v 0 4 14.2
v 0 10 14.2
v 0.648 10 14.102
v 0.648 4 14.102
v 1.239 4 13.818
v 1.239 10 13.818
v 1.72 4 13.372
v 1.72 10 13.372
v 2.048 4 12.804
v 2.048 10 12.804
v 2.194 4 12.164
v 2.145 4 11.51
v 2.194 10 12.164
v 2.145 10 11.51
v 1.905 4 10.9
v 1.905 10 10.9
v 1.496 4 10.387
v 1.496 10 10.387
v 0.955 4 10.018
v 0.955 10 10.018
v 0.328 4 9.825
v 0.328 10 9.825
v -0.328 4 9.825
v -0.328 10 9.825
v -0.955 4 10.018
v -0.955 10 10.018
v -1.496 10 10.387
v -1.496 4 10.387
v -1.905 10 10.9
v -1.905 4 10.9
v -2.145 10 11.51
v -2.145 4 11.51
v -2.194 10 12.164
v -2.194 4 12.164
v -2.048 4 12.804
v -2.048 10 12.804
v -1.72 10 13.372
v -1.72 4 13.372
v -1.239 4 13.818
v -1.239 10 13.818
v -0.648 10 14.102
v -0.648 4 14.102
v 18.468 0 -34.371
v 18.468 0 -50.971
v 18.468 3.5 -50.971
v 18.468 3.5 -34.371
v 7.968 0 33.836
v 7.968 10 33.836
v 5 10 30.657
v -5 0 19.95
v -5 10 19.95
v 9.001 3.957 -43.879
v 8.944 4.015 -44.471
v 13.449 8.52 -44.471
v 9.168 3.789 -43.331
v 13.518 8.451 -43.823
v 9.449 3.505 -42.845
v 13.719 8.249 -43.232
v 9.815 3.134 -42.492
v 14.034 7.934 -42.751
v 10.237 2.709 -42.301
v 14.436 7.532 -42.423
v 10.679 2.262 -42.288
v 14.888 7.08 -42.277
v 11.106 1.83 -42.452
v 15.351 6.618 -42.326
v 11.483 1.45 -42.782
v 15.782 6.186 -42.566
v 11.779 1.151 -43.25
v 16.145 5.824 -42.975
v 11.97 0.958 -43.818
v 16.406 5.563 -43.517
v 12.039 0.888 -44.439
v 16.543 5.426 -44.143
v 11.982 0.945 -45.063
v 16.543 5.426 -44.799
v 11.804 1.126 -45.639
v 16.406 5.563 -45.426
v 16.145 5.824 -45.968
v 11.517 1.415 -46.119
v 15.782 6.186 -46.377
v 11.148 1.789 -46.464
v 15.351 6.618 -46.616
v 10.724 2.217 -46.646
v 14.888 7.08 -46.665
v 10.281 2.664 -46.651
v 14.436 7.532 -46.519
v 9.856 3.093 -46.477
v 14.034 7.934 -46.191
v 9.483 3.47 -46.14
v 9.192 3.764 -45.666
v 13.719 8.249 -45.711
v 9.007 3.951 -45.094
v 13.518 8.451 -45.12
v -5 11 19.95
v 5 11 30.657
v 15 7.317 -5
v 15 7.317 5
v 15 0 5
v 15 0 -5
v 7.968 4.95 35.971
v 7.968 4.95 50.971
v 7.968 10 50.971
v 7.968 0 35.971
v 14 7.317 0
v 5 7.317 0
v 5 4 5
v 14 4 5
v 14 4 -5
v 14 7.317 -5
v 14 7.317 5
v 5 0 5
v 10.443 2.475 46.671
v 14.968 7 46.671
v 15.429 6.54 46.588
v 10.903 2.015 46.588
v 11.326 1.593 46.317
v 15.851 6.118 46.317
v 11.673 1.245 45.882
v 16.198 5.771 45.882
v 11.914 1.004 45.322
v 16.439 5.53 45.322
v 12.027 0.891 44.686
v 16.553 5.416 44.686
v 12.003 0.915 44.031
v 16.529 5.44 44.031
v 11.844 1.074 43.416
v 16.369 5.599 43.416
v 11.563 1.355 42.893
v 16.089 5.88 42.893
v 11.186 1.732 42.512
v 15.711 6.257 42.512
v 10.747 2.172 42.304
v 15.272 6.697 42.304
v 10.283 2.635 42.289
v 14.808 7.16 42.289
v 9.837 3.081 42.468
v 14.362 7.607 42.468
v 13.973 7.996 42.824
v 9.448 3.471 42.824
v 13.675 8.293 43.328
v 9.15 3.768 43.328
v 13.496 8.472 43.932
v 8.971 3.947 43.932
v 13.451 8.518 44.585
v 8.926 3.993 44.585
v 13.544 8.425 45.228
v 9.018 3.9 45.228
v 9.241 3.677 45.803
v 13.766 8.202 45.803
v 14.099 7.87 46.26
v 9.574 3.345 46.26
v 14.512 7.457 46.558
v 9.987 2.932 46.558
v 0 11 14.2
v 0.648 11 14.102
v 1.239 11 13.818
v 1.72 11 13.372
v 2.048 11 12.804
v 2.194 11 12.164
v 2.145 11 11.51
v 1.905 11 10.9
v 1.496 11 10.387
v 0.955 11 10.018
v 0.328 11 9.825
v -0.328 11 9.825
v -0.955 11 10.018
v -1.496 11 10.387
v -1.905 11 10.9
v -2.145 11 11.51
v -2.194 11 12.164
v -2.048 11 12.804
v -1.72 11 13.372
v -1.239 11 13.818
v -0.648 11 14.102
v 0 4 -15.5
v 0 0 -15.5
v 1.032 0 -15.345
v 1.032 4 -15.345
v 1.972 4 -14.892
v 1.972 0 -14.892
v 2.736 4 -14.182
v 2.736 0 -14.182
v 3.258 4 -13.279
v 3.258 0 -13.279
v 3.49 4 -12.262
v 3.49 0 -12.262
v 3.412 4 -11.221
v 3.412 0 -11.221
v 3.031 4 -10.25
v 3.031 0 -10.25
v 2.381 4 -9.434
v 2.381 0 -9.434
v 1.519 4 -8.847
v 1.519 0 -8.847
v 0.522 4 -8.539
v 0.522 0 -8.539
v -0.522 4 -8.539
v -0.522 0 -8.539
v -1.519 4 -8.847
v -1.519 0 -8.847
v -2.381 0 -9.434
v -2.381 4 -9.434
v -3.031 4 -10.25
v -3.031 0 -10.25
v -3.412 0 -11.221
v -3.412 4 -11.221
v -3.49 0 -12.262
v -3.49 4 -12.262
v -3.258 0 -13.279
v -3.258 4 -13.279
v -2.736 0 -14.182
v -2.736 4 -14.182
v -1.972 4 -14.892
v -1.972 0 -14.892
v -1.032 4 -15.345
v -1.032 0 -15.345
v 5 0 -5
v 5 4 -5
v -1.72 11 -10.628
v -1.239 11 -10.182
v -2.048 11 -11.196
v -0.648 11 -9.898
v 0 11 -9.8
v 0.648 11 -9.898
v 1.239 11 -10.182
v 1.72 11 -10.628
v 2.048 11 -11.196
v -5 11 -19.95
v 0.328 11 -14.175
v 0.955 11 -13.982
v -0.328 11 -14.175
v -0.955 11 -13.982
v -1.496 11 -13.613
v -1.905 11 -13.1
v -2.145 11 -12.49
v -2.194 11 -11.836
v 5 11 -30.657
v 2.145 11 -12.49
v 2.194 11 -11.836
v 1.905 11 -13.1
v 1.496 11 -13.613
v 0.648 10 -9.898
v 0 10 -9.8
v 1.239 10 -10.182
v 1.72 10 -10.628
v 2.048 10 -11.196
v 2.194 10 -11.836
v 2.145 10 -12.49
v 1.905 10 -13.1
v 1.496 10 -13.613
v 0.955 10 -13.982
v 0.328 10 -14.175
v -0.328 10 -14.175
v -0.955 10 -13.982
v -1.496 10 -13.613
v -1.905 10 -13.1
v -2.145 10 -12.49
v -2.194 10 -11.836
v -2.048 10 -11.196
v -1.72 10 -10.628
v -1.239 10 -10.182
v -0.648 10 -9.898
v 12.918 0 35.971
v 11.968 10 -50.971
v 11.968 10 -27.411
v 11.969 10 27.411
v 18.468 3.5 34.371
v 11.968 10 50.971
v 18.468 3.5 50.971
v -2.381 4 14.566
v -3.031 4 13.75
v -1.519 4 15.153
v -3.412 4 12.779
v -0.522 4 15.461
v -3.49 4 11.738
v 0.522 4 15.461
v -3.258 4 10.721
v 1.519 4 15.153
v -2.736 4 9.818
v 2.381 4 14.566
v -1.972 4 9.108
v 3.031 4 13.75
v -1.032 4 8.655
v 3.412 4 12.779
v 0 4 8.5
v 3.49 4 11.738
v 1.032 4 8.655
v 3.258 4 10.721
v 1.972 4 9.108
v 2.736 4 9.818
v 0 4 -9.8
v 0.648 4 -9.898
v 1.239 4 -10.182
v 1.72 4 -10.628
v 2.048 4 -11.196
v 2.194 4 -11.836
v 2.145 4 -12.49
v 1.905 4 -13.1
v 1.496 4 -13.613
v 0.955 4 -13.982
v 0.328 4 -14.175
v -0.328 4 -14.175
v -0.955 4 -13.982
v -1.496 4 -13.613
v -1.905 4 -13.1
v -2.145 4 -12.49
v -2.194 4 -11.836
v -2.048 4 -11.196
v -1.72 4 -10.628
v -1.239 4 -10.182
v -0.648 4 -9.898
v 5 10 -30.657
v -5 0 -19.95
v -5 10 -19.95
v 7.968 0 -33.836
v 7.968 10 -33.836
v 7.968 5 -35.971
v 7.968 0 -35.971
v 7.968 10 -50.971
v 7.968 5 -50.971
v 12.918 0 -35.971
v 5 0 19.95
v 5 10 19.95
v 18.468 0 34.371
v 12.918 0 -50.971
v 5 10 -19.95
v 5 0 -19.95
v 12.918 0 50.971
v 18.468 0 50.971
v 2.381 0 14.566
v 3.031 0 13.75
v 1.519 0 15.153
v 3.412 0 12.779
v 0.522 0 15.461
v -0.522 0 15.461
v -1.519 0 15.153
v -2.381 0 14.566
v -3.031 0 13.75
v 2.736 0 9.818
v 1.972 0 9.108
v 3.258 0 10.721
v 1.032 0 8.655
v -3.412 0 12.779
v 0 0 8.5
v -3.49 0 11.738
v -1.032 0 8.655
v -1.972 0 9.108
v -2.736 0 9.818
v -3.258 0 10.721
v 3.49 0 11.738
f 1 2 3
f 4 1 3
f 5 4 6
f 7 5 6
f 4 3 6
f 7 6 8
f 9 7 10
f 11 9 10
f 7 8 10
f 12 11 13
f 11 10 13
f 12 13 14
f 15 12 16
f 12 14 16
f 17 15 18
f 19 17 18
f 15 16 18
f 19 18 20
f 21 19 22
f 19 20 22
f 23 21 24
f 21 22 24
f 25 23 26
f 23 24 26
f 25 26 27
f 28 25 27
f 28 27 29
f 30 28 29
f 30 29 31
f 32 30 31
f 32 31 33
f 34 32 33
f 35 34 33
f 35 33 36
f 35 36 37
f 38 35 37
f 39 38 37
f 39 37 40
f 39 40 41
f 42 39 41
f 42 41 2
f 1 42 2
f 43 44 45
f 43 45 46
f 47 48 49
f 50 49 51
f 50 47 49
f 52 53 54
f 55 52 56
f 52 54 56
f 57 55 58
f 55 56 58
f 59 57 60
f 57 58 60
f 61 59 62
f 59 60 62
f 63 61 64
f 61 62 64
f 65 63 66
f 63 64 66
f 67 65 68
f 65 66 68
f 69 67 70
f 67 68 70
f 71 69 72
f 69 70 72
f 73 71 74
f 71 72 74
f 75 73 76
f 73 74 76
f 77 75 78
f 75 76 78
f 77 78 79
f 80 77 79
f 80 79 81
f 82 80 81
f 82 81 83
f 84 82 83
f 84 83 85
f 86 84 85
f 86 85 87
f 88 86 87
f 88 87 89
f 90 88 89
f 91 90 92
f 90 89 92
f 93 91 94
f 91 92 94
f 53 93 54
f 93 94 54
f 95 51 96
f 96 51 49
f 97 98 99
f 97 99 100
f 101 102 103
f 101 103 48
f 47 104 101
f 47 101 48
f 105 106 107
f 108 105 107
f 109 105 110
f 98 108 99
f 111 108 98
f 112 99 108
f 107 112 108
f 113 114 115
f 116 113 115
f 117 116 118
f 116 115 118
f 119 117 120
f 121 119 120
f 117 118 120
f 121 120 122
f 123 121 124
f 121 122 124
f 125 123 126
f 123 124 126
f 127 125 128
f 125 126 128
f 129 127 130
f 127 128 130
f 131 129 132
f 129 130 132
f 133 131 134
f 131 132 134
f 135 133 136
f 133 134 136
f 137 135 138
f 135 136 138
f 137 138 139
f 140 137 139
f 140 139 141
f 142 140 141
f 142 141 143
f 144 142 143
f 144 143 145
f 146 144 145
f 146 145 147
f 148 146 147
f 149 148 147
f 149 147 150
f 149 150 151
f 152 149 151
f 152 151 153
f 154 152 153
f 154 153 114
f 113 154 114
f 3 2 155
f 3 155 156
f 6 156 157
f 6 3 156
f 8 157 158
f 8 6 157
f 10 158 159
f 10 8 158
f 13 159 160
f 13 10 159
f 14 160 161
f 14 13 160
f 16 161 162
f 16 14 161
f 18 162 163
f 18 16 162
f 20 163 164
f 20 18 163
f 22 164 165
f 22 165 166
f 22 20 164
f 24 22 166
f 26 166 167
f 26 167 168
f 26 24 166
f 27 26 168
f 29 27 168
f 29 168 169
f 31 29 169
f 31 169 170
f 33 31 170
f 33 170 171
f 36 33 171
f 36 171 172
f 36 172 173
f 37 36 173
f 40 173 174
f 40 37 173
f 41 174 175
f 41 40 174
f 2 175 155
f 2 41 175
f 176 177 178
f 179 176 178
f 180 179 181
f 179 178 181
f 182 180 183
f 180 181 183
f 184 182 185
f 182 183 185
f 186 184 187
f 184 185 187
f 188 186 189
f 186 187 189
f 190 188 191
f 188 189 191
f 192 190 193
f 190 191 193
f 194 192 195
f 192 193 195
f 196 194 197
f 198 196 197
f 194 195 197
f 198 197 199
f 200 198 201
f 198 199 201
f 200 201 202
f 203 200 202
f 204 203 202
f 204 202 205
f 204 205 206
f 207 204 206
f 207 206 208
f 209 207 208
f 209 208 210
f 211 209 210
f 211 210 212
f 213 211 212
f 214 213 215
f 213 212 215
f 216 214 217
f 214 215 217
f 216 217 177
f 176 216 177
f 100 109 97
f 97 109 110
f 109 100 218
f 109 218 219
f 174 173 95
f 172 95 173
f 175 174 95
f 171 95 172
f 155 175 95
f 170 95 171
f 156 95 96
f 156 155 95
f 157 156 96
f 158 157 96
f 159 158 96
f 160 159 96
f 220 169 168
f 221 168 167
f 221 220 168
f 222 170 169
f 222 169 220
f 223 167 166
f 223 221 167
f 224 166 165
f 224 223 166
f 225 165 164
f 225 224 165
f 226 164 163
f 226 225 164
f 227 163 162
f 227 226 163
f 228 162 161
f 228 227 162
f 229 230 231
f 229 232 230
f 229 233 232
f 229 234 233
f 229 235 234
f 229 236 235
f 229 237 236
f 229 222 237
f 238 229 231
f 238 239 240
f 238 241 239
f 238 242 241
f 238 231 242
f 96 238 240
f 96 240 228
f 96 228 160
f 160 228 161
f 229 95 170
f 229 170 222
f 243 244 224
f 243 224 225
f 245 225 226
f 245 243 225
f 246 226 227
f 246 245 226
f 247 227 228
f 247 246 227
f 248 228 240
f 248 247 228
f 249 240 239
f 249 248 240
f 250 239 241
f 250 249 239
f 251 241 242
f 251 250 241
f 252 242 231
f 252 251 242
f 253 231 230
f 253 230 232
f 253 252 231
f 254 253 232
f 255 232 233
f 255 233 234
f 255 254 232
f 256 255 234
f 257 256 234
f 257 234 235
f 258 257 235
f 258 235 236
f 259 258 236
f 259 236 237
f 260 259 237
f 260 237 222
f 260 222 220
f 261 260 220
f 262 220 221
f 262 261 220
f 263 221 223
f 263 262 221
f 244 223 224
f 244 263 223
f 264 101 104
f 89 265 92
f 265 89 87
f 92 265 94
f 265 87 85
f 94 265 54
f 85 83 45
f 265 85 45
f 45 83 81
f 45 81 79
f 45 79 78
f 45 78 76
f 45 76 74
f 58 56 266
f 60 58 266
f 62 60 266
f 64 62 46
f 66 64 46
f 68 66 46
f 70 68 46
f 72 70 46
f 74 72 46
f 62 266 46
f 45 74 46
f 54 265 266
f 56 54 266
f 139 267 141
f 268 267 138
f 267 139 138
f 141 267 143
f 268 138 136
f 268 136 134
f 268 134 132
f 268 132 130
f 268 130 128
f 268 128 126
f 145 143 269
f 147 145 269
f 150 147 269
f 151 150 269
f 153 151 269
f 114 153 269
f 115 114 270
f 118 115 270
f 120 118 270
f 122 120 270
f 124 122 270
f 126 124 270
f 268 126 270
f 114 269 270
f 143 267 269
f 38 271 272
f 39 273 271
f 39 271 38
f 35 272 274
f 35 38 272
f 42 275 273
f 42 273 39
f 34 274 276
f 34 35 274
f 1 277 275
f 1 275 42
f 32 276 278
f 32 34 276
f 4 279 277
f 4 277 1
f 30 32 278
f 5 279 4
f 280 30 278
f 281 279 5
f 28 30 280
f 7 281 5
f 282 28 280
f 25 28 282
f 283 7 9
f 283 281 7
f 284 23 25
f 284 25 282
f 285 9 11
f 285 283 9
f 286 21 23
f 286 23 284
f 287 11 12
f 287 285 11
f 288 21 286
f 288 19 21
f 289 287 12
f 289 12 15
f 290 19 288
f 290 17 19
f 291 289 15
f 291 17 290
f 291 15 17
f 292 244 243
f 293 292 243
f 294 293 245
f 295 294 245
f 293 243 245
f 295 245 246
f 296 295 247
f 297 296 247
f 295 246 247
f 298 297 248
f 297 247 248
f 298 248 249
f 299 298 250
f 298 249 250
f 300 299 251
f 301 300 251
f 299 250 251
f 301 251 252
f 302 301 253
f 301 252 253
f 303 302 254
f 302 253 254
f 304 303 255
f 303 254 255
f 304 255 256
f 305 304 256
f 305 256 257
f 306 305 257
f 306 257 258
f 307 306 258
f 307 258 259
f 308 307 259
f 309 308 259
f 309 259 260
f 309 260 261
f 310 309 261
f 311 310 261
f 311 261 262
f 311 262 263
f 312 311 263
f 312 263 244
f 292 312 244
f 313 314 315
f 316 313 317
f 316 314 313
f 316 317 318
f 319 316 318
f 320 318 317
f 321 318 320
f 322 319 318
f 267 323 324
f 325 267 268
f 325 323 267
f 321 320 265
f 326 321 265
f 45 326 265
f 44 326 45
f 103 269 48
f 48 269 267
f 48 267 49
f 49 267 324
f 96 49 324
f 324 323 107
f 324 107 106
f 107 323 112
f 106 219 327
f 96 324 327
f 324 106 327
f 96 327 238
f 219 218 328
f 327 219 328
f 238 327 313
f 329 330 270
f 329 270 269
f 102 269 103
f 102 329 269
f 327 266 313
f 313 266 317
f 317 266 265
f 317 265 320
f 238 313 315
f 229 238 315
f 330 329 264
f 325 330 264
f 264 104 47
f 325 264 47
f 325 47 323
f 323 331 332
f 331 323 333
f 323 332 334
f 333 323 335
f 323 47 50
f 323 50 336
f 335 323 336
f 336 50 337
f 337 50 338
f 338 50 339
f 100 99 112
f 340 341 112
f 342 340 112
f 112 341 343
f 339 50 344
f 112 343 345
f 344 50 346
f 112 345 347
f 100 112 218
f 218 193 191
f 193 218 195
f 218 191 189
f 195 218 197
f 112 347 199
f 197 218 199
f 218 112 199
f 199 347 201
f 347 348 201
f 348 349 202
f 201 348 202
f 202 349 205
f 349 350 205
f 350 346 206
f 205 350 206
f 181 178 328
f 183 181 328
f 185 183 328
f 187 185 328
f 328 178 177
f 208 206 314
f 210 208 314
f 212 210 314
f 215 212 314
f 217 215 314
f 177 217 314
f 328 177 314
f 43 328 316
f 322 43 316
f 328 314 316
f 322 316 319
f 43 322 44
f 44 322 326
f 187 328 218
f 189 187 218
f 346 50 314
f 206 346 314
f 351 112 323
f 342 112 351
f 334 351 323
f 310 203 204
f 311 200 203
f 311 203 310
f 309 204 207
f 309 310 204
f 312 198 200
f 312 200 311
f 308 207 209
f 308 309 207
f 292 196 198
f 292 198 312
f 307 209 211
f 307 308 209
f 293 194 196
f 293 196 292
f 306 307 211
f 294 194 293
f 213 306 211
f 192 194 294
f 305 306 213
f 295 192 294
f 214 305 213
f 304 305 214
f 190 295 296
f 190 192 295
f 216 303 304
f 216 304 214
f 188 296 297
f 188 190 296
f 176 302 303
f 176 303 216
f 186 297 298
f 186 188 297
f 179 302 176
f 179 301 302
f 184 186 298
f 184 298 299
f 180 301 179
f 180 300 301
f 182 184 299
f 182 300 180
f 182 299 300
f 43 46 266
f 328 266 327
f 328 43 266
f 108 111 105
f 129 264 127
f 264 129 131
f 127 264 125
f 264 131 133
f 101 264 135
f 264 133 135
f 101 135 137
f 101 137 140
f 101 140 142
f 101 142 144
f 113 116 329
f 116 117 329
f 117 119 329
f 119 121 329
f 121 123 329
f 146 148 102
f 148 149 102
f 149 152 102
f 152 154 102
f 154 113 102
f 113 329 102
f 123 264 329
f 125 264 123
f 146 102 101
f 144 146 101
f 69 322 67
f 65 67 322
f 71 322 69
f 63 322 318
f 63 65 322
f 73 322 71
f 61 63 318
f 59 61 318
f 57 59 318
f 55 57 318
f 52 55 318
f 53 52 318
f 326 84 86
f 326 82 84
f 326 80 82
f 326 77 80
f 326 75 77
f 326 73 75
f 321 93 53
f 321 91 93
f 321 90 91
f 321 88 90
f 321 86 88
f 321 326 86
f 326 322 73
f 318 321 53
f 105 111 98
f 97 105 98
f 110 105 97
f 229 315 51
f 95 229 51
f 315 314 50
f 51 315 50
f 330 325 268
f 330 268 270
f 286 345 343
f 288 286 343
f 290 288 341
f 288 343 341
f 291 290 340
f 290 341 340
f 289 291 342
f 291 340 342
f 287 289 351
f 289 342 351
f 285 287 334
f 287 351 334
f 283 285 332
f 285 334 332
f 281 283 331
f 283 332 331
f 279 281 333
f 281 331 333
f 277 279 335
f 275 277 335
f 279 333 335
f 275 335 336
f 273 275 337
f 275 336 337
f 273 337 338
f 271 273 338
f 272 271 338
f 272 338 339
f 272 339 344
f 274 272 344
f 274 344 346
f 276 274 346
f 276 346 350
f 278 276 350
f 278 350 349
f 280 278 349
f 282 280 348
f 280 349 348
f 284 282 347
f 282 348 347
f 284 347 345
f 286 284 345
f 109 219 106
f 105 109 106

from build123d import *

# Parameters (mm, degrees)
BOSS_EXTRUDE1_DEPTH = 10
CUT_EXTRUDE1_DEPTH  = 102.942524855
SKETCH15_R          = 2.2
CUT_EXTRUDE5_DEPTH  = 20.069609228
CUT_EXTRUDE6_DEPTH  = 15
CUT_EXTRUDE7_DEPTH  = 15
BOSS_EXTRUDE2_DEPTH = 9
SKETCH21_W          = 10
SKETCH21_H          = 7.31662479
BOSS_EXTRUDE3_DEPTH = 1
SKETCH17_R          = 2.2
CUT_EXTRUDE8_DEPTH  = 11
SKETCH22_R          = 3.5
CUT_EXTRUDE9_DEPTH  = 4
SKETCH23_R          = 2.2
BOSS_EXTRUDE4_DEPTH = 1


with BuildPart() as part:
    # Sketch1 → Boss-Extrude1 (new body)
    with BuildSketch(Plane(origin=(0, 0, 0), x_dir=(1, 0, 0), z_dir=(0, 1, 0))):
        Polygon((-5, 19.95), (7.9685, 33.8358924), (7.9685, 50.971262428), (18.4685, 50.971262428), (18.4685, 34.371262428), (5, 19.95), (5, -19.95), (18.4685, -34.371262428), (18.4685, -50.971262428), (7.9685, -50.971262428), (7.9685, -33.8358924), (-5, -19.95), align=None)
    extrude(amount=BOSS_EXTRUDE1_DEPTH)

    # Sketch2 → Cut-Extrude1 (cut, through all)
    with BuildSketch(Plane.XY.offset(50.971262428)):
        Polygon((11.9685, 10), (18.4685, 3.5), (18.4685, 10), align=None)
    extrude(amount=-CUT_EXTRUDE1_DEPTH, mode=Mode.SUBTRACT)

    # Sketch15 → Cut-Extrude5 (cut, through all)
    with BuildSketch(Plane(origin=(10.98425, 10.98425, 0), x_dir=(0, 0, -1), z_dir=(0.707106781, 0.707106781, 0))):
        with Locations(Location((44.471262428, -5.685327854, 0), (0, 0, 90))):  # turned: the seam where the file's is
            Circle(SKETCH15_R)
        with Locations(Location((-44.471262428, -5.685327854, 0), (0, 0, 178.678239242))):  # turned: the seam where the file's is
            Circle(SKETCH15_R)
    extrude(amount=-CUT_EXTRUDE5_DEPTH, mode=Mode.SUBTRACT)

    # Sketch4 → Cut-Extrude6 (cut)
    with BuildSketch(Plane.XY.offset(50.971262428)):
        Polygon((7.9685, 4.949747468), (7.9685, 0), (12.918247468, 0), align=None)
    extrude(amount=-CUT_EXTRUDE6_DEPTH, mode=Mode.SUBTRACT)

    # Sketch18 → Cut-Extrude7 (cut)
    with BuildSketch(Plane(origin=(0, 0, -50.971262428), x_dir=(-1, 0, 0), z_dir=(0, 0, -1))):
        Polygon((-7.9685, 5), (-7.9685, 0), (-12.918247468, 0), align=None)
    extrude(amount=-CUT_EXTRUDE7_DEPTH, mode=Mode.SUBTRACT)

    # Sketch13 → Boss-Extrude2 (add)
    with BuildSketch(Plane(origin=(5, 0, 0), x_dir=(0, 0, -1), z_dir=(1, 0, 0))):
        Polygon((0, 7.31662479), (-5, 4), (-5, 0), (5, 0), (5, 4), align=None)
    extrude(amount=BOSS_EXTRUDE2_DEPTH)

    # Sketch21 → Boss-Extrude3 (add)
    with BuildSketch(Plane(origin=(14, 0, 0), x_dir=(0, 0, -1), z_dir=(1, 0, 0))):
        with Locations((0, 3.658312395)):
            Rectangle(SKETCH21_W, SKETCH21_H)
    extrude(amount=BOSS_EXTRUDE3_DEPTH)

    # Sketch17 → Cut-Extrude8 (cut, through all)
    with BuildSketch(Plane(origin=(0, 10, 0), x_dir=(1, 0, 0), z_dir=(0, 1, 0))):
        with Locations(Location((0, 12, 0), (0, 0, 270))):  # turned: the seam where the file's is
            Circle(SKETCH17_R)
        with Locations(Location((0, -12, 0), (0, 0, 270))):  # turned: the seam where the file's is
            Circle(SKETCH17_R)
    extrude(amount=-CUT_EXTRUDE8_DEPTH, mode=Mode.SUBTRACT)

    # Sketch22 → Cut-Extrude9 (cut)
    with BuildSketch(Plane.XZ):
        with Locations(Location((0, 12, 0), (0, 0, 270))):  # turned: the seam where the file's is
            Circle(SKETCH22_R)
        with Locations(Location((0, -12, 0), (0, 0, 270))):  # turned: the seam where the file's is
            Circle(SKETCH22_R)
    extrude(amount=-CUT_EXTRUDE9_DEPTH, mode=Mode.SUBTRACT)

    # Sketch23 → Boss-Extrude4 (add)
    with BuildSketch(Plane(origin=(0, 10, 0), x_dir=(1, 0, 0), z_dir=(0, 1, 0))):
        Polygon((5, -30.657400548), (5, 30.657400548), (-5, 19.95), (-5, -19.95), align=None)
        with Locations(Location((0, -12, 0), (0, 0, 270))):  # turned: the seam where the file's is
            Circle(SKETCH23_R, mode=Mode.SUBTRACT)
        with Locations(Location((0, 12, 0), (0, 0, 270))):  # turned: the seam where the file's is
            Circle(SKETCH23_R, mode=Mode.SUBTRACT)
    extrude(amount=BOSS_EXTRUDE4_DEPTH)


solid = part.part
